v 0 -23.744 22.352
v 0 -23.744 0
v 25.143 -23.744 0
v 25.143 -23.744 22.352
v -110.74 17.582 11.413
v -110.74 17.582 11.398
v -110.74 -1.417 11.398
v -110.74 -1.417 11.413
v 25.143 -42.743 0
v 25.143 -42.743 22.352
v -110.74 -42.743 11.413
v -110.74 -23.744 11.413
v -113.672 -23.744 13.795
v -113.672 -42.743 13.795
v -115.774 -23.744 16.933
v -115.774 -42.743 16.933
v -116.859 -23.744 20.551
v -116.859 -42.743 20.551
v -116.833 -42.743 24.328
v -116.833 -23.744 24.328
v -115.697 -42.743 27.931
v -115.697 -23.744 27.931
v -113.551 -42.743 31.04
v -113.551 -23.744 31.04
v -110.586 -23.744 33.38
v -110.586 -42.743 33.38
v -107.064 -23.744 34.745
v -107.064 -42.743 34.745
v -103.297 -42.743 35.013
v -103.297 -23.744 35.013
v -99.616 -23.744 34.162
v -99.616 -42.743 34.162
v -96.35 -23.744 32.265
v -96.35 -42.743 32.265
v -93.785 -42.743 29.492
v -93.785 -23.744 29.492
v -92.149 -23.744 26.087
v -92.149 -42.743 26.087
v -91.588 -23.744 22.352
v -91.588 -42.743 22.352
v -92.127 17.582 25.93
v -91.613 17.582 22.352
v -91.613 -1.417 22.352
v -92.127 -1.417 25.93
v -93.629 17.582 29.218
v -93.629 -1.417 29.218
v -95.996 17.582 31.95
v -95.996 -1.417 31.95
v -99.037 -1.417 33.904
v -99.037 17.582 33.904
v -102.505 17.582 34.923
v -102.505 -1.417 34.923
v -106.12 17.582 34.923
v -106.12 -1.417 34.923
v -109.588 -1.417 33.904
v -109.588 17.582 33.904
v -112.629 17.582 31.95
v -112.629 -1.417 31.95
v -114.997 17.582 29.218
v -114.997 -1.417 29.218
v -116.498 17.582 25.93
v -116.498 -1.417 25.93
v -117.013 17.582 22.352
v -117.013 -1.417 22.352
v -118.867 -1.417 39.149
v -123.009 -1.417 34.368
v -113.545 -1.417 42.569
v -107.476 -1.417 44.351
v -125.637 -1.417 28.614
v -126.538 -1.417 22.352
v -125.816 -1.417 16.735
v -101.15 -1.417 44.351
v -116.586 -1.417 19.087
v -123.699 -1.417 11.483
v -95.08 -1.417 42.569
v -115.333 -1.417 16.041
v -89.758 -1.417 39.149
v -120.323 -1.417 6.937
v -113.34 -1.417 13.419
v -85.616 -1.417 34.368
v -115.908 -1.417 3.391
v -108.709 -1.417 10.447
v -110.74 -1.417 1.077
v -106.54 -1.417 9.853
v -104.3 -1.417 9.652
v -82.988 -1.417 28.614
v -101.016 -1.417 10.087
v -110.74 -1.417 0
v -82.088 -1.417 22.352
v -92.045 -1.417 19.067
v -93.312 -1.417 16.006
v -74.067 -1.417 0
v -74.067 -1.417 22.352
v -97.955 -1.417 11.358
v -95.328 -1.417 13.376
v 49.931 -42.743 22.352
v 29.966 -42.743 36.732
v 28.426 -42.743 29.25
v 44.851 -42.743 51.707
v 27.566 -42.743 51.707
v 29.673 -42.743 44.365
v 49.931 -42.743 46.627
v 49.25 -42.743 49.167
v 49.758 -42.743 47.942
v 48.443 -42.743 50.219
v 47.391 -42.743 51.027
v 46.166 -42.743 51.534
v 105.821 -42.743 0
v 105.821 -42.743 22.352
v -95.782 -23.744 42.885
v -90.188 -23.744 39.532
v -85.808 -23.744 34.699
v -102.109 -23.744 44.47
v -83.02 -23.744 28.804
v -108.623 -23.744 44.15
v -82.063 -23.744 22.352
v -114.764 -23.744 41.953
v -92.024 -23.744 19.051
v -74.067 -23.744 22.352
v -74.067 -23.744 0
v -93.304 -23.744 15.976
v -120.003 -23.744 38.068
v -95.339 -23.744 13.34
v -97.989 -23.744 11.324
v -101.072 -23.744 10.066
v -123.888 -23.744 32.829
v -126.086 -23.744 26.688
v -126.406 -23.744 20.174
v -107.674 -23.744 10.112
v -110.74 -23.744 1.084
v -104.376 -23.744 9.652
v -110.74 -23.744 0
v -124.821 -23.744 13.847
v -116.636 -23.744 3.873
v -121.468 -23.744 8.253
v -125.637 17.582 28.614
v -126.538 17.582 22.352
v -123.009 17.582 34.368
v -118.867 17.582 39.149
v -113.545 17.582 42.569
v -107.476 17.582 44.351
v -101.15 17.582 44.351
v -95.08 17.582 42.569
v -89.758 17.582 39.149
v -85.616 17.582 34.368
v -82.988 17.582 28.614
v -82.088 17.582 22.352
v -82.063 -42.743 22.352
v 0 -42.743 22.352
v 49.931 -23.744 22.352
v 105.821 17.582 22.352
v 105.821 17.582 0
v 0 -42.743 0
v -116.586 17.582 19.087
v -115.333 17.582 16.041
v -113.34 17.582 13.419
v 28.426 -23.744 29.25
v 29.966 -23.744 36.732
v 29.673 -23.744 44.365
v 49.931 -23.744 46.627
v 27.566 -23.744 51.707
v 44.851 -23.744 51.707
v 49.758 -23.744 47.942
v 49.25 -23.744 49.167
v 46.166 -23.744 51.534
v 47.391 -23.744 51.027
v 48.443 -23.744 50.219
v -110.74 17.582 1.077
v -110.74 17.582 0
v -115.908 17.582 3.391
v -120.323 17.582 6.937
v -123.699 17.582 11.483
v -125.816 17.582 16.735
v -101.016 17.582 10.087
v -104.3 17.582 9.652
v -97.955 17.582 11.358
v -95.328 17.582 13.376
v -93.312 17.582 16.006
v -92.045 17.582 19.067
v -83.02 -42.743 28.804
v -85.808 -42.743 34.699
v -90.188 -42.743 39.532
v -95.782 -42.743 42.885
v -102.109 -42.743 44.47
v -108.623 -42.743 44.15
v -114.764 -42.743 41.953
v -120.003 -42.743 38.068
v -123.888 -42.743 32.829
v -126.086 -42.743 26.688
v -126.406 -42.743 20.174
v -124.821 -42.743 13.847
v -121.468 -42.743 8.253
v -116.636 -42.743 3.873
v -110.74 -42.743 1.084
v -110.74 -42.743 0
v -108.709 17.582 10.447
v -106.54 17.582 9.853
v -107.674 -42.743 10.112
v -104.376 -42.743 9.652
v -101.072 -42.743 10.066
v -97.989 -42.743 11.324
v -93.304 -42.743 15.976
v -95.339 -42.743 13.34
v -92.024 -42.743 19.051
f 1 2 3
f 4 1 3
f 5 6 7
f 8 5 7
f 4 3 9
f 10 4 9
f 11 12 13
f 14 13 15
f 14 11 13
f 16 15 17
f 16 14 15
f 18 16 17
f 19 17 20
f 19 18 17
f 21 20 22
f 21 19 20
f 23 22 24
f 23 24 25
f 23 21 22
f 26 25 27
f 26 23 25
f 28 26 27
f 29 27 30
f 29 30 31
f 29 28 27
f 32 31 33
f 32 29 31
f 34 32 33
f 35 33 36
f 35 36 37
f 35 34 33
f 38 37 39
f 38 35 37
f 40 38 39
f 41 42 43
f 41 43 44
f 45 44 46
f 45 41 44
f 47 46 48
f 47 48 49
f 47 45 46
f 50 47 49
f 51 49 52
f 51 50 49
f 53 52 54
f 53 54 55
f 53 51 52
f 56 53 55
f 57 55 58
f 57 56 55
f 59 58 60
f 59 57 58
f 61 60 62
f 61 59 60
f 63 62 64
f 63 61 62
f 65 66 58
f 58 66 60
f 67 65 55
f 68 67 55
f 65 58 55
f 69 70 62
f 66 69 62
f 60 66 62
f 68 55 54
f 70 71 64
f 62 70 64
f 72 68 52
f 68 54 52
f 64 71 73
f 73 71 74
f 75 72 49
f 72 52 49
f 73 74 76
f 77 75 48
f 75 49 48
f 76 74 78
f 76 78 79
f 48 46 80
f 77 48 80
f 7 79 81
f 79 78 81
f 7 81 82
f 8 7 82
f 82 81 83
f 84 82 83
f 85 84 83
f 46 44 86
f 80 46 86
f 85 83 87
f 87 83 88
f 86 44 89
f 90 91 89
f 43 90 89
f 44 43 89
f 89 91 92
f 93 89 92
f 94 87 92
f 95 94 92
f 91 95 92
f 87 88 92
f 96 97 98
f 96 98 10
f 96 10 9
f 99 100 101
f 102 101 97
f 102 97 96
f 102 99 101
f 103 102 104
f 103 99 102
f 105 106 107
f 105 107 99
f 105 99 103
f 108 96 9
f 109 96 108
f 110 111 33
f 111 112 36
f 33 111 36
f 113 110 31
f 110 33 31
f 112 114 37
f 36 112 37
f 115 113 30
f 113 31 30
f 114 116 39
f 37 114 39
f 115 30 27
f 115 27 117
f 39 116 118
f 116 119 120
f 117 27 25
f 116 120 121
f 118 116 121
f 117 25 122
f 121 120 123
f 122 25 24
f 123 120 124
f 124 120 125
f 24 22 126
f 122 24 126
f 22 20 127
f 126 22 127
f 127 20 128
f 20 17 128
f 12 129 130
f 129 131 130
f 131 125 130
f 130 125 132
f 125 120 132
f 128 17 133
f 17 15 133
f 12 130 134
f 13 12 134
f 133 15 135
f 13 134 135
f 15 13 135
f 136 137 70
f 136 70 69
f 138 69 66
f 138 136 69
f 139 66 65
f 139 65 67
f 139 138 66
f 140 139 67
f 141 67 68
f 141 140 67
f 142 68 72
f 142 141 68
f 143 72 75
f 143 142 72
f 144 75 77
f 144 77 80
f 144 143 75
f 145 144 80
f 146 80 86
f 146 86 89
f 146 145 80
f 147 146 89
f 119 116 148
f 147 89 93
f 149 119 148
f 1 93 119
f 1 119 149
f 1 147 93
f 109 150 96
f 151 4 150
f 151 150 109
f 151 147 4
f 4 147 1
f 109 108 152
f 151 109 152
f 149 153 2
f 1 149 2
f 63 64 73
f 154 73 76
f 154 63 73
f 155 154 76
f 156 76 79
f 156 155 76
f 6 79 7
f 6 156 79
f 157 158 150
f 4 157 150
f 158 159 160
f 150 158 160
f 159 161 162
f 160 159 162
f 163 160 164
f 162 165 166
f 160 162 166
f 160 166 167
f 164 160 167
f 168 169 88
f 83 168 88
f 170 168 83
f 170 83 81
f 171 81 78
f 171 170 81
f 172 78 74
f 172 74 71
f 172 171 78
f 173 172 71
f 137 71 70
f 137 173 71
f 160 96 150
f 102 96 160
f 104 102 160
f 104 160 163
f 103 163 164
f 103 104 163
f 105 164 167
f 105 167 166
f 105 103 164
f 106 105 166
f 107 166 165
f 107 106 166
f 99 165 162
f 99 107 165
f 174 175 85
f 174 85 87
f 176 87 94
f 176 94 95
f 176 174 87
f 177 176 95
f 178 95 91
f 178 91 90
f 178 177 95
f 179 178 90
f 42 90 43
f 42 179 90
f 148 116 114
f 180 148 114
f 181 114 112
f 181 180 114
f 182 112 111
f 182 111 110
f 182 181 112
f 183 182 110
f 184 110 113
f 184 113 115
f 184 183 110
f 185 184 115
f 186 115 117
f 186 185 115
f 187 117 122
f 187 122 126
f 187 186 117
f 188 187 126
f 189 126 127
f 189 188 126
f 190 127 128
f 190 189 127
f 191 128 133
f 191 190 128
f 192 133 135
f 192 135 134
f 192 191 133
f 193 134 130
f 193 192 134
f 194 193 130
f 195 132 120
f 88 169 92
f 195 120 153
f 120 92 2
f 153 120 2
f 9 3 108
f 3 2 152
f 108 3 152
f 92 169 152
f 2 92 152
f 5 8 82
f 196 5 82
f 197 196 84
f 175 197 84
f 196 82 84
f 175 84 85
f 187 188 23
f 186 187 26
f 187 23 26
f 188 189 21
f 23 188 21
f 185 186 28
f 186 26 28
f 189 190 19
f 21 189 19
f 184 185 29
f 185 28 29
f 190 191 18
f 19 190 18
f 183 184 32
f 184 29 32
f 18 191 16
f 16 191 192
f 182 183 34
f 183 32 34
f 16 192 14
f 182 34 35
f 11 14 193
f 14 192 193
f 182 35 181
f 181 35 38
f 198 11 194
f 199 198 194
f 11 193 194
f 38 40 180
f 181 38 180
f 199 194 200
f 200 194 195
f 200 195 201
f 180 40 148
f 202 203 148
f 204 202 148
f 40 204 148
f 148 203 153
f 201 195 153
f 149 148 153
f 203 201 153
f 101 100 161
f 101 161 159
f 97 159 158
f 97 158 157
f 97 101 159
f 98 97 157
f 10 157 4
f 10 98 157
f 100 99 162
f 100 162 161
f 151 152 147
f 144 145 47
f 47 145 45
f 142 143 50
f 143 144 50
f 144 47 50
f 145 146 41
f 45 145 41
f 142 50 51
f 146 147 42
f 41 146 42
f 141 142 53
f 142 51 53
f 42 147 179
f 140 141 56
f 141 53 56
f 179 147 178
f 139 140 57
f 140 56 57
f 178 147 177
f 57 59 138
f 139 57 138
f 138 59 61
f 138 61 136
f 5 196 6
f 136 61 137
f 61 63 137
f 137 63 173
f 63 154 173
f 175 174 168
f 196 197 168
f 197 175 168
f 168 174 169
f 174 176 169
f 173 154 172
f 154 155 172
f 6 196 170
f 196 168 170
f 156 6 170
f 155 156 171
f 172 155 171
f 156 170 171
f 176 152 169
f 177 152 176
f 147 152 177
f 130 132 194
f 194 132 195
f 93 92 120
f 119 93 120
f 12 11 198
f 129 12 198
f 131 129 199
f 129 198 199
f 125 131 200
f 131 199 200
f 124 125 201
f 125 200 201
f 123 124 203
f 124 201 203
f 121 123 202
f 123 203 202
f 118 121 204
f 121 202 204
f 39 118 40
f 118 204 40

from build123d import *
from build123d import SkipClean  # not in build123d's __all__

# Parameters (mm, degrees)
F1_DEPTH = 22.352
F4_DEPTH = 60.326
F5_DEPTH = 18.9992
F6_DEPTH = 18.9992
F8_DEPTH = 18.9992


with BuildPart() as f1:
    # F0 (on Top) → F1 (new body)
    with BuildSketch(Plane.XY):
        Polygon((105.8206515543, 17.5817109668), (-110.7397484457, 17.5817109668), (-110.7397484457, -1.4174890332), (-74.0668755353, -1.4174890332), (-74.0668755353, -23.7440890332), (-110.7397484457, -23.7440890332), (-110.7397484457, -42.7432890332), (0, -42.7432890332), (0, -23.7440890332), (25.1433271915, -23.7440890332), (25.1433271915, -42.7432890332), (105.8206515543, -42.7432890332), align=None)
    extrude(amount=F1_DEPTH)

    # F2 (on face) → F4 (cut, through all)
    with BuildSketch(Plane.XZ.offset(42.7432890332)):
        with BuildLine():
            ThreePointArc((-110.7397484457, 11.4130391755), (-97.9889229317, 11.3240532527), (-91.5876839638, 22.352))
            Line((-91.5876839638, 22.352), (-110.7397484457, 22.352))
            Line((-110.7397484457, 22.352), (-110.7397484457, 11.4130391755))
        make_face()
    extrude(amount=-F4_DEPTH, mode=Mode.SUBTRACT)

    # F2 (on face) → F5 (join)
    with BuildSketch(Plane.XZ.offset(42.7432890332)):
        with BuildLine():
            ThreePointArc((-110.7397484457, 1.0841489351), (-91.0484715271, 4.5005608688), (-82.0626839638, 22.352))
            Line((-82.0626839638, 22.352), (-91.5876839638, 22.352))
            ThreePointArc((-91.5876839638, 22.352), (-97.9889229317, 11.3240532527), (-110.7397484457, 11.4130391755))
            Line((-110.7397484457, 11.4130391755), (-110.7397484457, 1.0841489351))
        make_face()
        with BuildLine():
            Line((-91.5876839638, 22.352), (-82.0626839638, 22.352))
            ThreePointArc((-82.0626839638, 22.352), (-117.5268964005, 40.2034391312), (-110.7397484457, 1.0841489351))
            Line((-110.7397484457, 1.0841489351), (-110.7397484457, 11.4130391755))
            ThreePointArc((-110.7397484457, 11.4130391755), (-110.5864449959, 33.3799467473), (-91.5876839638, 22.352))
        make_face()
    with SkipClean():  # cleaning this boolean's faces spoils the solid; the shape is the same uncleaned
        extrude(amount=-F5_DEPTH)

    # F3 (on face) → F6 (join)
    with BuildSketch(Plane(origin=(0, 17.5817109668, 0), x_dir=(-1, 0, 0), z_dir=(0, 1, 0))):
        with BuildLine():
            Line((91.6125912547, 22.352), (82.0875912547, 22.352))
            ThreePointArc((82.0875912547, 22.352), (91.062929817, 4.5083149326), (110.7397484457, 1.0766086889))
            Line((110.7397484457, 1.0766086889), (110.7397484457, 11.3983864208))
            ThreePointArc((110.7397484457, 11.3983864208), (98.0012877573, 11.331226517), (91.6125912547, 22.352))
        make_face()
        with BuildLine():
            ThreePointArc((110.7397484457, 1.0766086889), (122.1562763221, 9.1023385623), (126.5375912547, 22.352))
            ThreePointArc((126.5375912547, 22.352), (104.3125912547, 44.577), (82.0875912547, 22.352))
            Line((82.0875912547, 22.352), (91.6125912547, 22.352))
            ThreePointArc((91.6125912547, 22.352), (104.3125912547, 35.052), (117.0125912547, 22.352))
            ThreePointArc((117.0125912547, 22.352), (115.3333647377, 16.0406965025), (110.7397484457, 11.3983864208))
            Line((110.7397484457, 11.3983864208), (110.7397484457, 1.0766086889))
        make_face()
    extrude(amount=-F6_DEPTH)

    # F7 (on face) → F8 (join)
    with BuildSketch(Plane.XZ.offset(42.7432890332)):
        with BuildLine():
            Line((44.8509039521, 51.7072044313), (27.5659821928, 51.7072044313))
            ThreePointArc((27.5659821928, 51.7072044313), (29.9657018108, 36.7315861898), (25.1433271915, 22.352))
            Line((25.1433271915, 22.352), (49.9309039521, 22.352))
            Line((49.9309039521, 22.352), (49.9309039521, 46.6272044313))
            ThreePointArc((49.9309039521, 46.6272044313), (48.4430064005, 50.2193068797), (44.8509039521, 51.7072044313))
        make_face()
    extrude(amount=-F8_DEPTH)


solid = f1.part
